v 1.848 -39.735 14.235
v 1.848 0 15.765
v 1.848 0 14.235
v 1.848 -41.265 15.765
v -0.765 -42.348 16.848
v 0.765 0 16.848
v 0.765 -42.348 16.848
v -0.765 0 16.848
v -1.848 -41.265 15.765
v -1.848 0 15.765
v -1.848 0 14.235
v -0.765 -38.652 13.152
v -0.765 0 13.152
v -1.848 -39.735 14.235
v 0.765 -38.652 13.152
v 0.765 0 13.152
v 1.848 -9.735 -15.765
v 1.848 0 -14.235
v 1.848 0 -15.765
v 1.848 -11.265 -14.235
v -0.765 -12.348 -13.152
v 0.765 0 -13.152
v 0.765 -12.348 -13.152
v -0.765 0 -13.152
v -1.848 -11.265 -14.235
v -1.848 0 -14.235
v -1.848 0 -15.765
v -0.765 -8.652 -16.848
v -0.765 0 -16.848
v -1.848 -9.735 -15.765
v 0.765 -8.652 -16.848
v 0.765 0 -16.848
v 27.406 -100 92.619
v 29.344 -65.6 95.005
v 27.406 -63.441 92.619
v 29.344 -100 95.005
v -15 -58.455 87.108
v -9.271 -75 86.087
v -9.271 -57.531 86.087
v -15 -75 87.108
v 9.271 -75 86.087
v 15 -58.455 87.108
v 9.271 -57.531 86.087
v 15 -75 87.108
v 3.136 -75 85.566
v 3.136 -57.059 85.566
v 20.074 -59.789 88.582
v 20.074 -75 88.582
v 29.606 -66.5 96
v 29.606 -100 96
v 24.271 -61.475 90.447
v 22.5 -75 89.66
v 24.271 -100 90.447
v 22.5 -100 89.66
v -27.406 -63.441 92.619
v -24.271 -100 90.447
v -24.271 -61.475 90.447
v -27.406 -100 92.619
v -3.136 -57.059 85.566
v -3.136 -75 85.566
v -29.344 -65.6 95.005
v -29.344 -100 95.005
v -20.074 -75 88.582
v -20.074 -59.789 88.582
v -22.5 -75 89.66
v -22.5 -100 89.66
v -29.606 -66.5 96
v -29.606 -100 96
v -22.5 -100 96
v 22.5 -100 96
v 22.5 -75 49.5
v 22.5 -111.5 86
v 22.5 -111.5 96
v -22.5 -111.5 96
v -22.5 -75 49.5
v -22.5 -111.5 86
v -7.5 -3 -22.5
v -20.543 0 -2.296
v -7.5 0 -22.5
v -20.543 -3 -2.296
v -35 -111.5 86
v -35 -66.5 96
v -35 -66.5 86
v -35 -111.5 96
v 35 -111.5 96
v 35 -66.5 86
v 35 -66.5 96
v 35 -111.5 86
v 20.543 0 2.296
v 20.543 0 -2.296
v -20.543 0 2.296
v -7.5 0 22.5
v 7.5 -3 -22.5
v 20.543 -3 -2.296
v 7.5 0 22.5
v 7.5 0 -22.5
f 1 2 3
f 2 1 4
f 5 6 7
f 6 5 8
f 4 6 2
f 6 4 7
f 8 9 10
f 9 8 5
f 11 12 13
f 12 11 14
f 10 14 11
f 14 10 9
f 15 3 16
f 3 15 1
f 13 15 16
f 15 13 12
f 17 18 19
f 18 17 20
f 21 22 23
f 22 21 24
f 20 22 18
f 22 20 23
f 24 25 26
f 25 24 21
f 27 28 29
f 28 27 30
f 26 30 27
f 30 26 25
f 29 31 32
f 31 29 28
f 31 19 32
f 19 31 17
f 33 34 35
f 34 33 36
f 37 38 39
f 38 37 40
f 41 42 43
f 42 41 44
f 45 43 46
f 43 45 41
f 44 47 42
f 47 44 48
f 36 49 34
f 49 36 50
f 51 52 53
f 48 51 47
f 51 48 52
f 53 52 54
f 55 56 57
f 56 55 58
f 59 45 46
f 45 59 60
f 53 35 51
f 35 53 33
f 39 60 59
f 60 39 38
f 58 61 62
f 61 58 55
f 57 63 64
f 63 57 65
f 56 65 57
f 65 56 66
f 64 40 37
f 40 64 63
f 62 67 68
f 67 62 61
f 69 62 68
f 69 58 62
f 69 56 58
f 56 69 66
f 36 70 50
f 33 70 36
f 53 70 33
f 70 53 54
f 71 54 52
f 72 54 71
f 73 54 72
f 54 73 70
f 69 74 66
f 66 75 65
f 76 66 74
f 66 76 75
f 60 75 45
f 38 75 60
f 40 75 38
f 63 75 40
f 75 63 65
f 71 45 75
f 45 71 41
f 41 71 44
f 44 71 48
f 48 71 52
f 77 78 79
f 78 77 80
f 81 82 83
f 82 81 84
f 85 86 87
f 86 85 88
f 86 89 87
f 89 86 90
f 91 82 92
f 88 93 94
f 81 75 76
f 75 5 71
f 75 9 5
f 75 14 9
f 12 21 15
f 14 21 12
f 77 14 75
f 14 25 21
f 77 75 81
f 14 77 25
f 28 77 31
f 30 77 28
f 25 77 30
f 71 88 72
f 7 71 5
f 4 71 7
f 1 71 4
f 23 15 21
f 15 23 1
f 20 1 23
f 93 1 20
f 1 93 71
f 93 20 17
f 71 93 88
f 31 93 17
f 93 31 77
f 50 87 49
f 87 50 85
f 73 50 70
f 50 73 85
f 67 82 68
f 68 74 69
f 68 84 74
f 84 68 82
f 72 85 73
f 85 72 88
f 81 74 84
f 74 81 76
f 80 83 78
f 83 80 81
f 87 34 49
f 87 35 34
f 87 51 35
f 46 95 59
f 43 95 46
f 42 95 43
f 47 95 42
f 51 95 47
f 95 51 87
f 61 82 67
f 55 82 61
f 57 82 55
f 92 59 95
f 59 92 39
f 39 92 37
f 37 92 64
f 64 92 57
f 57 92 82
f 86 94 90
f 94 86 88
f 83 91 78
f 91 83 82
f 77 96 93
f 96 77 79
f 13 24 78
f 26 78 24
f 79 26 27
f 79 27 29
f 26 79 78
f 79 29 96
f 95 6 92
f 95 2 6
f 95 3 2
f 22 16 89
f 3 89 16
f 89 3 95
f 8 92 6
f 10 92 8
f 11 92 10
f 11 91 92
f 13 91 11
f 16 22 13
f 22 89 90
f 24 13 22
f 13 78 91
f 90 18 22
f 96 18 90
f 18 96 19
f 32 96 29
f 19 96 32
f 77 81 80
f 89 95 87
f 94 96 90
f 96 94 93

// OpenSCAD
top = 1;
bottom = -1;
left = -1;
right = 1;
front = -1;
rear = 1;

neck_width     = 45;
head_width     = 60;
head_thickness = 25;

notch_depth   = 0;
opening_width = 0;

plate_thickness = 3;

dist_from_wall = 75;

screw_diam = 4;
screw_hole_spacing = 30;

total_depth = dist_from_wall+head_thickness;
neck_pos = dist_from_wall+head_thickness/2;

module main() {
  // rotate the part 45deg to see what it looks like IRL

  module body() {
    // plate
    translate([0,plate_thickness/2*front,0]) {
      hull() {
        for(side=[left,right]) {
          translate([15*side,0,0])
            rotate([90,0,0]) rotate([0,0,22.5])
              cylinder(r=screw_diam*1.5,h=plate_thickness,center=true,$fn=8);
        }
        for(end=[top,bottom]) {
          translate([0,0,screw_hole_spacing/2*end])
            cube([15,plate_thickness,15],center=true);
        }

        translate([0,front*neck_pos,neck_pos+3.5]) {
          cube([head_width+10,30+15,10],center=true);
        }
      }
    }
  }

  module holes() {
    % translate([0,dist_from_wall/2*front,dist_from_wall+20]) cube([10,dist_from_wall,10],center=true);

    translate([0,(neck_pos-10)*front,neck_pos+10])
      scale([1,1,.4])
        rotate([90,0,0])
          cylinder(r=head_width/2,h=head_thickness+20,center=true);

    // neck opening
    translate([0,(dist_from_wall+head_thickness/2+10)*front,total_depth/2])
      cube([neck_width,head_thickness+20,total_depth],center=true);

    // screw holes
    for(side=[top,bottom]) {
      translate([0,0,screw_hole_spacing/2*side])
        rotate([90,0,0]) rotate([0,0,22.5])
          cylinder(r=screw_diam/2,h=100,center=true,$fn=8);
    }
  }

  difference() {
    body();
    holes();
  }
}

module to_print() {
  rotate([45,0,0])
    main();
}

main();
//to_print();
